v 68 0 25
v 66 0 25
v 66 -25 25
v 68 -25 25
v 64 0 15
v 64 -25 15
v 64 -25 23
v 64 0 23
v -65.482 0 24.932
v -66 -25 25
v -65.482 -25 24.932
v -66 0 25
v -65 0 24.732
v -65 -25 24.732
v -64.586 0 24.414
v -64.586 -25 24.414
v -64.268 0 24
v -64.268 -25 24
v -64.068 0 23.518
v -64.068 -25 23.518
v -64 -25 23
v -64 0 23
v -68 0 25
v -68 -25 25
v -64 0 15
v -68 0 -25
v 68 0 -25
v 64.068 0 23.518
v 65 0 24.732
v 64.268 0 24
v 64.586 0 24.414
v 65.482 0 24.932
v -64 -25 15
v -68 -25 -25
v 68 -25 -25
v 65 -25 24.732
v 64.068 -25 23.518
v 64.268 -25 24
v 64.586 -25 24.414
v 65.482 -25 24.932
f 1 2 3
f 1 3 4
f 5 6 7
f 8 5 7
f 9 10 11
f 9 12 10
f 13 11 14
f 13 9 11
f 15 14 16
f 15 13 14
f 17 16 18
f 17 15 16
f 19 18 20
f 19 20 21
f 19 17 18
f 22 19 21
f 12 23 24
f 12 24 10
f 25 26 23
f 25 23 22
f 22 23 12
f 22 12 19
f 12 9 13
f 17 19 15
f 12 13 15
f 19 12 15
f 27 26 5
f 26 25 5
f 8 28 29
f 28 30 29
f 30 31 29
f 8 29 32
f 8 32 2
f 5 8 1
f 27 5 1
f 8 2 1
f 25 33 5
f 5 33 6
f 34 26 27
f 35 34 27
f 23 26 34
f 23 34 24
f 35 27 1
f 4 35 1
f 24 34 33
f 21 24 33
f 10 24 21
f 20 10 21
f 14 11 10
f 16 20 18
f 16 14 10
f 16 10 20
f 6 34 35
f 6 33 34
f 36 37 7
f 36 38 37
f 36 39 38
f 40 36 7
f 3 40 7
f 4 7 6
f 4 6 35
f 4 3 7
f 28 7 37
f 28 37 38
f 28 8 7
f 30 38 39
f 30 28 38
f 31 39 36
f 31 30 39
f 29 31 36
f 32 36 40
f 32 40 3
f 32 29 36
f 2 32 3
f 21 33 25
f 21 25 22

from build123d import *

# Parameters (mm, degrees)
F0_W     = 136
F0_H     = 50
F1_DEPTH = 25
F2_W     = 128
F2_H     = 10
F3_DEPTH = 25.001
F4_R     = 2


with BuildPart() as f1:
    # F0 (on Front) → F1 (new body)
    with BuildSketch(Plane.XZ):
        Rectangle(F0_W, F0_H)
    extrude(amount=F1_DEPTH)

    # F2 (on face) → F3 (cut, through all)
    with BuildSketch(Plane.XZ.offset(25)):
        with Locations((0, 20)):
            Rectangle(F2_W, F2_H)
    extrude(amount=-F3_DEPTH, mode=Mode.SUBTRACT)

    # F4
    f4_edges = [f1.edges().sort_by_distance(p)[0] for p in [
        (-64, -12.5, 25),
        (64, -12.5, 25),
    ]]
    fillet(f4_edges, radius=F4_R)


solid = f1.part
